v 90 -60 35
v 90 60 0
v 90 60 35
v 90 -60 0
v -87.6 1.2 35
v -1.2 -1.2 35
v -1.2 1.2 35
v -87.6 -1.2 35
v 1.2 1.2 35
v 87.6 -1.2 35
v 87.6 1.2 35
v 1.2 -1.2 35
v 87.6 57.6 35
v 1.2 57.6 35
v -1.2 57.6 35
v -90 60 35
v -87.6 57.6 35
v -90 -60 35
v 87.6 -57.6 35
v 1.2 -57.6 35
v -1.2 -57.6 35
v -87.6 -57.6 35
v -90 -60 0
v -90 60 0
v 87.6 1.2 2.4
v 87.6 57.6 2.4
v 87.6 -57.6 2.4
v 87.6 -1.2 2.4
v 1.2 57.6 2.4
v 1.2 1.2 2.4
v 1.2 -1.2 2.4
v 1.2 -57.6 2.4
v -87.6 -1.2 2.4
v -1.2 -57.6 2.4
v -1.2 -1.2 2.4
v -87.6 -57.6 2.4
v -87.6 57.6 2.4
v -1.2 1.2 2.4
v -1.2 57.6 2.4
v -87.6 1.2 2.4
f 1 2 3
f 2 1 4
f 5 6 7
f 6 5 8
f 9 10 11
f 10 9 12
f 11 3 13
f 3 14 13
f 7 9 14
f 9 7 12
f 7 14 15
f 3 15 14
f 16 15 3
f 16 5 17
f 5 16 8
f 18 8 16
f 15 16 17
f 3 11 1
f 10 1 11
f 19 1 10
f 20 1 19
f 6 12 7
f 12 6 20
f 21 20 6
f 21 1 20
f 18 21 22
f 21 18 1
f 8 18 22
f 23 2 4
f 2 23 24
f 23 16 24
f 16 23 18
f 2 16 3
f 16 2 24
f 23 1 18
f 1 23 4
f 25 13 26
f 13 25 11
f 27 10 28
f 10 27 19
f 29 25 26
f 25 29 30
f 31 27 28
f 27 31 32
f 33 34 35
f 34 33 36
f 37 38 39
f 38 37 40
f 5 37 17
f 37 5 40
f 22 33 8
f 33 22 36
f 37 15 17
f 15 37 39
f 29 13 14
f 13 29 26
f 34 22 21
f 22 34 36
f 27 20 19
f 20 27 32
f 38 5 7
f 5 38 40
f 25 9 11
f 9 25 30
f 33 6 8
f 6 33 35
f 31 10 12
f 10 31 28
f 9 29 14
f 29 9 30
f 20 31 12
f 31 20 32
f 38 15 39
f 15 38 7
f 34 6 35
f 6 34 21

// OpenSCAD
// 桌面收纳盒（四隔层）— OpenSCAD 参数化源文件
// 外廓 180 × 120 × 35 mm，壁厚 2.4 mm，2×2 十字隔层
// 单位: mm
// 用法: openscad -o desk_organizer_4comp.stl desk_organizer.scad

outer_length = 180;
outer_width  = 120;
outer_height = 35;
wall   = 2.4;
bottom = 2.4;
div    = 2.4;
nx = 2;
ny = 2;

$fn = 32;

difference() {
    // 外箱体
    translate([0, 0, outer_height/2])
        cube([outer_length, outer_width, outer_height], center=true);

    // 内腔（开口朝上，从顶面挖到底板上表面）
    translate([0, 0, (bottom + outer_height)/2])
        cube([outer_length - 2*wall, outer_width - 2*wall, outer_height - bottom], center=true);
}

// X 方向隔墙（分隔 Y），ny-1 道
inner_l = outer_length - 2*wall;
inner_w = outer_width - 2*wall;
inner_h = outer_height - bottom;
for (i = [1:ny-1])
    translate([
        0,
        -inner_w/2 + i*(inner_w/ny),
        (bottom + outer_height)/2
    ])
    cube([inner_l, div, inner_h], center=true);

// Y 方向隔墙（分隔 X），nx-1 道
for (i = [1:nx-1])
    translate([
        -inner_l/2 + i*(inner_l/nx),
        0,
        (bottom + outer_height)/2
    ])
    cube([div, inner_w, inner_h], center=true);
